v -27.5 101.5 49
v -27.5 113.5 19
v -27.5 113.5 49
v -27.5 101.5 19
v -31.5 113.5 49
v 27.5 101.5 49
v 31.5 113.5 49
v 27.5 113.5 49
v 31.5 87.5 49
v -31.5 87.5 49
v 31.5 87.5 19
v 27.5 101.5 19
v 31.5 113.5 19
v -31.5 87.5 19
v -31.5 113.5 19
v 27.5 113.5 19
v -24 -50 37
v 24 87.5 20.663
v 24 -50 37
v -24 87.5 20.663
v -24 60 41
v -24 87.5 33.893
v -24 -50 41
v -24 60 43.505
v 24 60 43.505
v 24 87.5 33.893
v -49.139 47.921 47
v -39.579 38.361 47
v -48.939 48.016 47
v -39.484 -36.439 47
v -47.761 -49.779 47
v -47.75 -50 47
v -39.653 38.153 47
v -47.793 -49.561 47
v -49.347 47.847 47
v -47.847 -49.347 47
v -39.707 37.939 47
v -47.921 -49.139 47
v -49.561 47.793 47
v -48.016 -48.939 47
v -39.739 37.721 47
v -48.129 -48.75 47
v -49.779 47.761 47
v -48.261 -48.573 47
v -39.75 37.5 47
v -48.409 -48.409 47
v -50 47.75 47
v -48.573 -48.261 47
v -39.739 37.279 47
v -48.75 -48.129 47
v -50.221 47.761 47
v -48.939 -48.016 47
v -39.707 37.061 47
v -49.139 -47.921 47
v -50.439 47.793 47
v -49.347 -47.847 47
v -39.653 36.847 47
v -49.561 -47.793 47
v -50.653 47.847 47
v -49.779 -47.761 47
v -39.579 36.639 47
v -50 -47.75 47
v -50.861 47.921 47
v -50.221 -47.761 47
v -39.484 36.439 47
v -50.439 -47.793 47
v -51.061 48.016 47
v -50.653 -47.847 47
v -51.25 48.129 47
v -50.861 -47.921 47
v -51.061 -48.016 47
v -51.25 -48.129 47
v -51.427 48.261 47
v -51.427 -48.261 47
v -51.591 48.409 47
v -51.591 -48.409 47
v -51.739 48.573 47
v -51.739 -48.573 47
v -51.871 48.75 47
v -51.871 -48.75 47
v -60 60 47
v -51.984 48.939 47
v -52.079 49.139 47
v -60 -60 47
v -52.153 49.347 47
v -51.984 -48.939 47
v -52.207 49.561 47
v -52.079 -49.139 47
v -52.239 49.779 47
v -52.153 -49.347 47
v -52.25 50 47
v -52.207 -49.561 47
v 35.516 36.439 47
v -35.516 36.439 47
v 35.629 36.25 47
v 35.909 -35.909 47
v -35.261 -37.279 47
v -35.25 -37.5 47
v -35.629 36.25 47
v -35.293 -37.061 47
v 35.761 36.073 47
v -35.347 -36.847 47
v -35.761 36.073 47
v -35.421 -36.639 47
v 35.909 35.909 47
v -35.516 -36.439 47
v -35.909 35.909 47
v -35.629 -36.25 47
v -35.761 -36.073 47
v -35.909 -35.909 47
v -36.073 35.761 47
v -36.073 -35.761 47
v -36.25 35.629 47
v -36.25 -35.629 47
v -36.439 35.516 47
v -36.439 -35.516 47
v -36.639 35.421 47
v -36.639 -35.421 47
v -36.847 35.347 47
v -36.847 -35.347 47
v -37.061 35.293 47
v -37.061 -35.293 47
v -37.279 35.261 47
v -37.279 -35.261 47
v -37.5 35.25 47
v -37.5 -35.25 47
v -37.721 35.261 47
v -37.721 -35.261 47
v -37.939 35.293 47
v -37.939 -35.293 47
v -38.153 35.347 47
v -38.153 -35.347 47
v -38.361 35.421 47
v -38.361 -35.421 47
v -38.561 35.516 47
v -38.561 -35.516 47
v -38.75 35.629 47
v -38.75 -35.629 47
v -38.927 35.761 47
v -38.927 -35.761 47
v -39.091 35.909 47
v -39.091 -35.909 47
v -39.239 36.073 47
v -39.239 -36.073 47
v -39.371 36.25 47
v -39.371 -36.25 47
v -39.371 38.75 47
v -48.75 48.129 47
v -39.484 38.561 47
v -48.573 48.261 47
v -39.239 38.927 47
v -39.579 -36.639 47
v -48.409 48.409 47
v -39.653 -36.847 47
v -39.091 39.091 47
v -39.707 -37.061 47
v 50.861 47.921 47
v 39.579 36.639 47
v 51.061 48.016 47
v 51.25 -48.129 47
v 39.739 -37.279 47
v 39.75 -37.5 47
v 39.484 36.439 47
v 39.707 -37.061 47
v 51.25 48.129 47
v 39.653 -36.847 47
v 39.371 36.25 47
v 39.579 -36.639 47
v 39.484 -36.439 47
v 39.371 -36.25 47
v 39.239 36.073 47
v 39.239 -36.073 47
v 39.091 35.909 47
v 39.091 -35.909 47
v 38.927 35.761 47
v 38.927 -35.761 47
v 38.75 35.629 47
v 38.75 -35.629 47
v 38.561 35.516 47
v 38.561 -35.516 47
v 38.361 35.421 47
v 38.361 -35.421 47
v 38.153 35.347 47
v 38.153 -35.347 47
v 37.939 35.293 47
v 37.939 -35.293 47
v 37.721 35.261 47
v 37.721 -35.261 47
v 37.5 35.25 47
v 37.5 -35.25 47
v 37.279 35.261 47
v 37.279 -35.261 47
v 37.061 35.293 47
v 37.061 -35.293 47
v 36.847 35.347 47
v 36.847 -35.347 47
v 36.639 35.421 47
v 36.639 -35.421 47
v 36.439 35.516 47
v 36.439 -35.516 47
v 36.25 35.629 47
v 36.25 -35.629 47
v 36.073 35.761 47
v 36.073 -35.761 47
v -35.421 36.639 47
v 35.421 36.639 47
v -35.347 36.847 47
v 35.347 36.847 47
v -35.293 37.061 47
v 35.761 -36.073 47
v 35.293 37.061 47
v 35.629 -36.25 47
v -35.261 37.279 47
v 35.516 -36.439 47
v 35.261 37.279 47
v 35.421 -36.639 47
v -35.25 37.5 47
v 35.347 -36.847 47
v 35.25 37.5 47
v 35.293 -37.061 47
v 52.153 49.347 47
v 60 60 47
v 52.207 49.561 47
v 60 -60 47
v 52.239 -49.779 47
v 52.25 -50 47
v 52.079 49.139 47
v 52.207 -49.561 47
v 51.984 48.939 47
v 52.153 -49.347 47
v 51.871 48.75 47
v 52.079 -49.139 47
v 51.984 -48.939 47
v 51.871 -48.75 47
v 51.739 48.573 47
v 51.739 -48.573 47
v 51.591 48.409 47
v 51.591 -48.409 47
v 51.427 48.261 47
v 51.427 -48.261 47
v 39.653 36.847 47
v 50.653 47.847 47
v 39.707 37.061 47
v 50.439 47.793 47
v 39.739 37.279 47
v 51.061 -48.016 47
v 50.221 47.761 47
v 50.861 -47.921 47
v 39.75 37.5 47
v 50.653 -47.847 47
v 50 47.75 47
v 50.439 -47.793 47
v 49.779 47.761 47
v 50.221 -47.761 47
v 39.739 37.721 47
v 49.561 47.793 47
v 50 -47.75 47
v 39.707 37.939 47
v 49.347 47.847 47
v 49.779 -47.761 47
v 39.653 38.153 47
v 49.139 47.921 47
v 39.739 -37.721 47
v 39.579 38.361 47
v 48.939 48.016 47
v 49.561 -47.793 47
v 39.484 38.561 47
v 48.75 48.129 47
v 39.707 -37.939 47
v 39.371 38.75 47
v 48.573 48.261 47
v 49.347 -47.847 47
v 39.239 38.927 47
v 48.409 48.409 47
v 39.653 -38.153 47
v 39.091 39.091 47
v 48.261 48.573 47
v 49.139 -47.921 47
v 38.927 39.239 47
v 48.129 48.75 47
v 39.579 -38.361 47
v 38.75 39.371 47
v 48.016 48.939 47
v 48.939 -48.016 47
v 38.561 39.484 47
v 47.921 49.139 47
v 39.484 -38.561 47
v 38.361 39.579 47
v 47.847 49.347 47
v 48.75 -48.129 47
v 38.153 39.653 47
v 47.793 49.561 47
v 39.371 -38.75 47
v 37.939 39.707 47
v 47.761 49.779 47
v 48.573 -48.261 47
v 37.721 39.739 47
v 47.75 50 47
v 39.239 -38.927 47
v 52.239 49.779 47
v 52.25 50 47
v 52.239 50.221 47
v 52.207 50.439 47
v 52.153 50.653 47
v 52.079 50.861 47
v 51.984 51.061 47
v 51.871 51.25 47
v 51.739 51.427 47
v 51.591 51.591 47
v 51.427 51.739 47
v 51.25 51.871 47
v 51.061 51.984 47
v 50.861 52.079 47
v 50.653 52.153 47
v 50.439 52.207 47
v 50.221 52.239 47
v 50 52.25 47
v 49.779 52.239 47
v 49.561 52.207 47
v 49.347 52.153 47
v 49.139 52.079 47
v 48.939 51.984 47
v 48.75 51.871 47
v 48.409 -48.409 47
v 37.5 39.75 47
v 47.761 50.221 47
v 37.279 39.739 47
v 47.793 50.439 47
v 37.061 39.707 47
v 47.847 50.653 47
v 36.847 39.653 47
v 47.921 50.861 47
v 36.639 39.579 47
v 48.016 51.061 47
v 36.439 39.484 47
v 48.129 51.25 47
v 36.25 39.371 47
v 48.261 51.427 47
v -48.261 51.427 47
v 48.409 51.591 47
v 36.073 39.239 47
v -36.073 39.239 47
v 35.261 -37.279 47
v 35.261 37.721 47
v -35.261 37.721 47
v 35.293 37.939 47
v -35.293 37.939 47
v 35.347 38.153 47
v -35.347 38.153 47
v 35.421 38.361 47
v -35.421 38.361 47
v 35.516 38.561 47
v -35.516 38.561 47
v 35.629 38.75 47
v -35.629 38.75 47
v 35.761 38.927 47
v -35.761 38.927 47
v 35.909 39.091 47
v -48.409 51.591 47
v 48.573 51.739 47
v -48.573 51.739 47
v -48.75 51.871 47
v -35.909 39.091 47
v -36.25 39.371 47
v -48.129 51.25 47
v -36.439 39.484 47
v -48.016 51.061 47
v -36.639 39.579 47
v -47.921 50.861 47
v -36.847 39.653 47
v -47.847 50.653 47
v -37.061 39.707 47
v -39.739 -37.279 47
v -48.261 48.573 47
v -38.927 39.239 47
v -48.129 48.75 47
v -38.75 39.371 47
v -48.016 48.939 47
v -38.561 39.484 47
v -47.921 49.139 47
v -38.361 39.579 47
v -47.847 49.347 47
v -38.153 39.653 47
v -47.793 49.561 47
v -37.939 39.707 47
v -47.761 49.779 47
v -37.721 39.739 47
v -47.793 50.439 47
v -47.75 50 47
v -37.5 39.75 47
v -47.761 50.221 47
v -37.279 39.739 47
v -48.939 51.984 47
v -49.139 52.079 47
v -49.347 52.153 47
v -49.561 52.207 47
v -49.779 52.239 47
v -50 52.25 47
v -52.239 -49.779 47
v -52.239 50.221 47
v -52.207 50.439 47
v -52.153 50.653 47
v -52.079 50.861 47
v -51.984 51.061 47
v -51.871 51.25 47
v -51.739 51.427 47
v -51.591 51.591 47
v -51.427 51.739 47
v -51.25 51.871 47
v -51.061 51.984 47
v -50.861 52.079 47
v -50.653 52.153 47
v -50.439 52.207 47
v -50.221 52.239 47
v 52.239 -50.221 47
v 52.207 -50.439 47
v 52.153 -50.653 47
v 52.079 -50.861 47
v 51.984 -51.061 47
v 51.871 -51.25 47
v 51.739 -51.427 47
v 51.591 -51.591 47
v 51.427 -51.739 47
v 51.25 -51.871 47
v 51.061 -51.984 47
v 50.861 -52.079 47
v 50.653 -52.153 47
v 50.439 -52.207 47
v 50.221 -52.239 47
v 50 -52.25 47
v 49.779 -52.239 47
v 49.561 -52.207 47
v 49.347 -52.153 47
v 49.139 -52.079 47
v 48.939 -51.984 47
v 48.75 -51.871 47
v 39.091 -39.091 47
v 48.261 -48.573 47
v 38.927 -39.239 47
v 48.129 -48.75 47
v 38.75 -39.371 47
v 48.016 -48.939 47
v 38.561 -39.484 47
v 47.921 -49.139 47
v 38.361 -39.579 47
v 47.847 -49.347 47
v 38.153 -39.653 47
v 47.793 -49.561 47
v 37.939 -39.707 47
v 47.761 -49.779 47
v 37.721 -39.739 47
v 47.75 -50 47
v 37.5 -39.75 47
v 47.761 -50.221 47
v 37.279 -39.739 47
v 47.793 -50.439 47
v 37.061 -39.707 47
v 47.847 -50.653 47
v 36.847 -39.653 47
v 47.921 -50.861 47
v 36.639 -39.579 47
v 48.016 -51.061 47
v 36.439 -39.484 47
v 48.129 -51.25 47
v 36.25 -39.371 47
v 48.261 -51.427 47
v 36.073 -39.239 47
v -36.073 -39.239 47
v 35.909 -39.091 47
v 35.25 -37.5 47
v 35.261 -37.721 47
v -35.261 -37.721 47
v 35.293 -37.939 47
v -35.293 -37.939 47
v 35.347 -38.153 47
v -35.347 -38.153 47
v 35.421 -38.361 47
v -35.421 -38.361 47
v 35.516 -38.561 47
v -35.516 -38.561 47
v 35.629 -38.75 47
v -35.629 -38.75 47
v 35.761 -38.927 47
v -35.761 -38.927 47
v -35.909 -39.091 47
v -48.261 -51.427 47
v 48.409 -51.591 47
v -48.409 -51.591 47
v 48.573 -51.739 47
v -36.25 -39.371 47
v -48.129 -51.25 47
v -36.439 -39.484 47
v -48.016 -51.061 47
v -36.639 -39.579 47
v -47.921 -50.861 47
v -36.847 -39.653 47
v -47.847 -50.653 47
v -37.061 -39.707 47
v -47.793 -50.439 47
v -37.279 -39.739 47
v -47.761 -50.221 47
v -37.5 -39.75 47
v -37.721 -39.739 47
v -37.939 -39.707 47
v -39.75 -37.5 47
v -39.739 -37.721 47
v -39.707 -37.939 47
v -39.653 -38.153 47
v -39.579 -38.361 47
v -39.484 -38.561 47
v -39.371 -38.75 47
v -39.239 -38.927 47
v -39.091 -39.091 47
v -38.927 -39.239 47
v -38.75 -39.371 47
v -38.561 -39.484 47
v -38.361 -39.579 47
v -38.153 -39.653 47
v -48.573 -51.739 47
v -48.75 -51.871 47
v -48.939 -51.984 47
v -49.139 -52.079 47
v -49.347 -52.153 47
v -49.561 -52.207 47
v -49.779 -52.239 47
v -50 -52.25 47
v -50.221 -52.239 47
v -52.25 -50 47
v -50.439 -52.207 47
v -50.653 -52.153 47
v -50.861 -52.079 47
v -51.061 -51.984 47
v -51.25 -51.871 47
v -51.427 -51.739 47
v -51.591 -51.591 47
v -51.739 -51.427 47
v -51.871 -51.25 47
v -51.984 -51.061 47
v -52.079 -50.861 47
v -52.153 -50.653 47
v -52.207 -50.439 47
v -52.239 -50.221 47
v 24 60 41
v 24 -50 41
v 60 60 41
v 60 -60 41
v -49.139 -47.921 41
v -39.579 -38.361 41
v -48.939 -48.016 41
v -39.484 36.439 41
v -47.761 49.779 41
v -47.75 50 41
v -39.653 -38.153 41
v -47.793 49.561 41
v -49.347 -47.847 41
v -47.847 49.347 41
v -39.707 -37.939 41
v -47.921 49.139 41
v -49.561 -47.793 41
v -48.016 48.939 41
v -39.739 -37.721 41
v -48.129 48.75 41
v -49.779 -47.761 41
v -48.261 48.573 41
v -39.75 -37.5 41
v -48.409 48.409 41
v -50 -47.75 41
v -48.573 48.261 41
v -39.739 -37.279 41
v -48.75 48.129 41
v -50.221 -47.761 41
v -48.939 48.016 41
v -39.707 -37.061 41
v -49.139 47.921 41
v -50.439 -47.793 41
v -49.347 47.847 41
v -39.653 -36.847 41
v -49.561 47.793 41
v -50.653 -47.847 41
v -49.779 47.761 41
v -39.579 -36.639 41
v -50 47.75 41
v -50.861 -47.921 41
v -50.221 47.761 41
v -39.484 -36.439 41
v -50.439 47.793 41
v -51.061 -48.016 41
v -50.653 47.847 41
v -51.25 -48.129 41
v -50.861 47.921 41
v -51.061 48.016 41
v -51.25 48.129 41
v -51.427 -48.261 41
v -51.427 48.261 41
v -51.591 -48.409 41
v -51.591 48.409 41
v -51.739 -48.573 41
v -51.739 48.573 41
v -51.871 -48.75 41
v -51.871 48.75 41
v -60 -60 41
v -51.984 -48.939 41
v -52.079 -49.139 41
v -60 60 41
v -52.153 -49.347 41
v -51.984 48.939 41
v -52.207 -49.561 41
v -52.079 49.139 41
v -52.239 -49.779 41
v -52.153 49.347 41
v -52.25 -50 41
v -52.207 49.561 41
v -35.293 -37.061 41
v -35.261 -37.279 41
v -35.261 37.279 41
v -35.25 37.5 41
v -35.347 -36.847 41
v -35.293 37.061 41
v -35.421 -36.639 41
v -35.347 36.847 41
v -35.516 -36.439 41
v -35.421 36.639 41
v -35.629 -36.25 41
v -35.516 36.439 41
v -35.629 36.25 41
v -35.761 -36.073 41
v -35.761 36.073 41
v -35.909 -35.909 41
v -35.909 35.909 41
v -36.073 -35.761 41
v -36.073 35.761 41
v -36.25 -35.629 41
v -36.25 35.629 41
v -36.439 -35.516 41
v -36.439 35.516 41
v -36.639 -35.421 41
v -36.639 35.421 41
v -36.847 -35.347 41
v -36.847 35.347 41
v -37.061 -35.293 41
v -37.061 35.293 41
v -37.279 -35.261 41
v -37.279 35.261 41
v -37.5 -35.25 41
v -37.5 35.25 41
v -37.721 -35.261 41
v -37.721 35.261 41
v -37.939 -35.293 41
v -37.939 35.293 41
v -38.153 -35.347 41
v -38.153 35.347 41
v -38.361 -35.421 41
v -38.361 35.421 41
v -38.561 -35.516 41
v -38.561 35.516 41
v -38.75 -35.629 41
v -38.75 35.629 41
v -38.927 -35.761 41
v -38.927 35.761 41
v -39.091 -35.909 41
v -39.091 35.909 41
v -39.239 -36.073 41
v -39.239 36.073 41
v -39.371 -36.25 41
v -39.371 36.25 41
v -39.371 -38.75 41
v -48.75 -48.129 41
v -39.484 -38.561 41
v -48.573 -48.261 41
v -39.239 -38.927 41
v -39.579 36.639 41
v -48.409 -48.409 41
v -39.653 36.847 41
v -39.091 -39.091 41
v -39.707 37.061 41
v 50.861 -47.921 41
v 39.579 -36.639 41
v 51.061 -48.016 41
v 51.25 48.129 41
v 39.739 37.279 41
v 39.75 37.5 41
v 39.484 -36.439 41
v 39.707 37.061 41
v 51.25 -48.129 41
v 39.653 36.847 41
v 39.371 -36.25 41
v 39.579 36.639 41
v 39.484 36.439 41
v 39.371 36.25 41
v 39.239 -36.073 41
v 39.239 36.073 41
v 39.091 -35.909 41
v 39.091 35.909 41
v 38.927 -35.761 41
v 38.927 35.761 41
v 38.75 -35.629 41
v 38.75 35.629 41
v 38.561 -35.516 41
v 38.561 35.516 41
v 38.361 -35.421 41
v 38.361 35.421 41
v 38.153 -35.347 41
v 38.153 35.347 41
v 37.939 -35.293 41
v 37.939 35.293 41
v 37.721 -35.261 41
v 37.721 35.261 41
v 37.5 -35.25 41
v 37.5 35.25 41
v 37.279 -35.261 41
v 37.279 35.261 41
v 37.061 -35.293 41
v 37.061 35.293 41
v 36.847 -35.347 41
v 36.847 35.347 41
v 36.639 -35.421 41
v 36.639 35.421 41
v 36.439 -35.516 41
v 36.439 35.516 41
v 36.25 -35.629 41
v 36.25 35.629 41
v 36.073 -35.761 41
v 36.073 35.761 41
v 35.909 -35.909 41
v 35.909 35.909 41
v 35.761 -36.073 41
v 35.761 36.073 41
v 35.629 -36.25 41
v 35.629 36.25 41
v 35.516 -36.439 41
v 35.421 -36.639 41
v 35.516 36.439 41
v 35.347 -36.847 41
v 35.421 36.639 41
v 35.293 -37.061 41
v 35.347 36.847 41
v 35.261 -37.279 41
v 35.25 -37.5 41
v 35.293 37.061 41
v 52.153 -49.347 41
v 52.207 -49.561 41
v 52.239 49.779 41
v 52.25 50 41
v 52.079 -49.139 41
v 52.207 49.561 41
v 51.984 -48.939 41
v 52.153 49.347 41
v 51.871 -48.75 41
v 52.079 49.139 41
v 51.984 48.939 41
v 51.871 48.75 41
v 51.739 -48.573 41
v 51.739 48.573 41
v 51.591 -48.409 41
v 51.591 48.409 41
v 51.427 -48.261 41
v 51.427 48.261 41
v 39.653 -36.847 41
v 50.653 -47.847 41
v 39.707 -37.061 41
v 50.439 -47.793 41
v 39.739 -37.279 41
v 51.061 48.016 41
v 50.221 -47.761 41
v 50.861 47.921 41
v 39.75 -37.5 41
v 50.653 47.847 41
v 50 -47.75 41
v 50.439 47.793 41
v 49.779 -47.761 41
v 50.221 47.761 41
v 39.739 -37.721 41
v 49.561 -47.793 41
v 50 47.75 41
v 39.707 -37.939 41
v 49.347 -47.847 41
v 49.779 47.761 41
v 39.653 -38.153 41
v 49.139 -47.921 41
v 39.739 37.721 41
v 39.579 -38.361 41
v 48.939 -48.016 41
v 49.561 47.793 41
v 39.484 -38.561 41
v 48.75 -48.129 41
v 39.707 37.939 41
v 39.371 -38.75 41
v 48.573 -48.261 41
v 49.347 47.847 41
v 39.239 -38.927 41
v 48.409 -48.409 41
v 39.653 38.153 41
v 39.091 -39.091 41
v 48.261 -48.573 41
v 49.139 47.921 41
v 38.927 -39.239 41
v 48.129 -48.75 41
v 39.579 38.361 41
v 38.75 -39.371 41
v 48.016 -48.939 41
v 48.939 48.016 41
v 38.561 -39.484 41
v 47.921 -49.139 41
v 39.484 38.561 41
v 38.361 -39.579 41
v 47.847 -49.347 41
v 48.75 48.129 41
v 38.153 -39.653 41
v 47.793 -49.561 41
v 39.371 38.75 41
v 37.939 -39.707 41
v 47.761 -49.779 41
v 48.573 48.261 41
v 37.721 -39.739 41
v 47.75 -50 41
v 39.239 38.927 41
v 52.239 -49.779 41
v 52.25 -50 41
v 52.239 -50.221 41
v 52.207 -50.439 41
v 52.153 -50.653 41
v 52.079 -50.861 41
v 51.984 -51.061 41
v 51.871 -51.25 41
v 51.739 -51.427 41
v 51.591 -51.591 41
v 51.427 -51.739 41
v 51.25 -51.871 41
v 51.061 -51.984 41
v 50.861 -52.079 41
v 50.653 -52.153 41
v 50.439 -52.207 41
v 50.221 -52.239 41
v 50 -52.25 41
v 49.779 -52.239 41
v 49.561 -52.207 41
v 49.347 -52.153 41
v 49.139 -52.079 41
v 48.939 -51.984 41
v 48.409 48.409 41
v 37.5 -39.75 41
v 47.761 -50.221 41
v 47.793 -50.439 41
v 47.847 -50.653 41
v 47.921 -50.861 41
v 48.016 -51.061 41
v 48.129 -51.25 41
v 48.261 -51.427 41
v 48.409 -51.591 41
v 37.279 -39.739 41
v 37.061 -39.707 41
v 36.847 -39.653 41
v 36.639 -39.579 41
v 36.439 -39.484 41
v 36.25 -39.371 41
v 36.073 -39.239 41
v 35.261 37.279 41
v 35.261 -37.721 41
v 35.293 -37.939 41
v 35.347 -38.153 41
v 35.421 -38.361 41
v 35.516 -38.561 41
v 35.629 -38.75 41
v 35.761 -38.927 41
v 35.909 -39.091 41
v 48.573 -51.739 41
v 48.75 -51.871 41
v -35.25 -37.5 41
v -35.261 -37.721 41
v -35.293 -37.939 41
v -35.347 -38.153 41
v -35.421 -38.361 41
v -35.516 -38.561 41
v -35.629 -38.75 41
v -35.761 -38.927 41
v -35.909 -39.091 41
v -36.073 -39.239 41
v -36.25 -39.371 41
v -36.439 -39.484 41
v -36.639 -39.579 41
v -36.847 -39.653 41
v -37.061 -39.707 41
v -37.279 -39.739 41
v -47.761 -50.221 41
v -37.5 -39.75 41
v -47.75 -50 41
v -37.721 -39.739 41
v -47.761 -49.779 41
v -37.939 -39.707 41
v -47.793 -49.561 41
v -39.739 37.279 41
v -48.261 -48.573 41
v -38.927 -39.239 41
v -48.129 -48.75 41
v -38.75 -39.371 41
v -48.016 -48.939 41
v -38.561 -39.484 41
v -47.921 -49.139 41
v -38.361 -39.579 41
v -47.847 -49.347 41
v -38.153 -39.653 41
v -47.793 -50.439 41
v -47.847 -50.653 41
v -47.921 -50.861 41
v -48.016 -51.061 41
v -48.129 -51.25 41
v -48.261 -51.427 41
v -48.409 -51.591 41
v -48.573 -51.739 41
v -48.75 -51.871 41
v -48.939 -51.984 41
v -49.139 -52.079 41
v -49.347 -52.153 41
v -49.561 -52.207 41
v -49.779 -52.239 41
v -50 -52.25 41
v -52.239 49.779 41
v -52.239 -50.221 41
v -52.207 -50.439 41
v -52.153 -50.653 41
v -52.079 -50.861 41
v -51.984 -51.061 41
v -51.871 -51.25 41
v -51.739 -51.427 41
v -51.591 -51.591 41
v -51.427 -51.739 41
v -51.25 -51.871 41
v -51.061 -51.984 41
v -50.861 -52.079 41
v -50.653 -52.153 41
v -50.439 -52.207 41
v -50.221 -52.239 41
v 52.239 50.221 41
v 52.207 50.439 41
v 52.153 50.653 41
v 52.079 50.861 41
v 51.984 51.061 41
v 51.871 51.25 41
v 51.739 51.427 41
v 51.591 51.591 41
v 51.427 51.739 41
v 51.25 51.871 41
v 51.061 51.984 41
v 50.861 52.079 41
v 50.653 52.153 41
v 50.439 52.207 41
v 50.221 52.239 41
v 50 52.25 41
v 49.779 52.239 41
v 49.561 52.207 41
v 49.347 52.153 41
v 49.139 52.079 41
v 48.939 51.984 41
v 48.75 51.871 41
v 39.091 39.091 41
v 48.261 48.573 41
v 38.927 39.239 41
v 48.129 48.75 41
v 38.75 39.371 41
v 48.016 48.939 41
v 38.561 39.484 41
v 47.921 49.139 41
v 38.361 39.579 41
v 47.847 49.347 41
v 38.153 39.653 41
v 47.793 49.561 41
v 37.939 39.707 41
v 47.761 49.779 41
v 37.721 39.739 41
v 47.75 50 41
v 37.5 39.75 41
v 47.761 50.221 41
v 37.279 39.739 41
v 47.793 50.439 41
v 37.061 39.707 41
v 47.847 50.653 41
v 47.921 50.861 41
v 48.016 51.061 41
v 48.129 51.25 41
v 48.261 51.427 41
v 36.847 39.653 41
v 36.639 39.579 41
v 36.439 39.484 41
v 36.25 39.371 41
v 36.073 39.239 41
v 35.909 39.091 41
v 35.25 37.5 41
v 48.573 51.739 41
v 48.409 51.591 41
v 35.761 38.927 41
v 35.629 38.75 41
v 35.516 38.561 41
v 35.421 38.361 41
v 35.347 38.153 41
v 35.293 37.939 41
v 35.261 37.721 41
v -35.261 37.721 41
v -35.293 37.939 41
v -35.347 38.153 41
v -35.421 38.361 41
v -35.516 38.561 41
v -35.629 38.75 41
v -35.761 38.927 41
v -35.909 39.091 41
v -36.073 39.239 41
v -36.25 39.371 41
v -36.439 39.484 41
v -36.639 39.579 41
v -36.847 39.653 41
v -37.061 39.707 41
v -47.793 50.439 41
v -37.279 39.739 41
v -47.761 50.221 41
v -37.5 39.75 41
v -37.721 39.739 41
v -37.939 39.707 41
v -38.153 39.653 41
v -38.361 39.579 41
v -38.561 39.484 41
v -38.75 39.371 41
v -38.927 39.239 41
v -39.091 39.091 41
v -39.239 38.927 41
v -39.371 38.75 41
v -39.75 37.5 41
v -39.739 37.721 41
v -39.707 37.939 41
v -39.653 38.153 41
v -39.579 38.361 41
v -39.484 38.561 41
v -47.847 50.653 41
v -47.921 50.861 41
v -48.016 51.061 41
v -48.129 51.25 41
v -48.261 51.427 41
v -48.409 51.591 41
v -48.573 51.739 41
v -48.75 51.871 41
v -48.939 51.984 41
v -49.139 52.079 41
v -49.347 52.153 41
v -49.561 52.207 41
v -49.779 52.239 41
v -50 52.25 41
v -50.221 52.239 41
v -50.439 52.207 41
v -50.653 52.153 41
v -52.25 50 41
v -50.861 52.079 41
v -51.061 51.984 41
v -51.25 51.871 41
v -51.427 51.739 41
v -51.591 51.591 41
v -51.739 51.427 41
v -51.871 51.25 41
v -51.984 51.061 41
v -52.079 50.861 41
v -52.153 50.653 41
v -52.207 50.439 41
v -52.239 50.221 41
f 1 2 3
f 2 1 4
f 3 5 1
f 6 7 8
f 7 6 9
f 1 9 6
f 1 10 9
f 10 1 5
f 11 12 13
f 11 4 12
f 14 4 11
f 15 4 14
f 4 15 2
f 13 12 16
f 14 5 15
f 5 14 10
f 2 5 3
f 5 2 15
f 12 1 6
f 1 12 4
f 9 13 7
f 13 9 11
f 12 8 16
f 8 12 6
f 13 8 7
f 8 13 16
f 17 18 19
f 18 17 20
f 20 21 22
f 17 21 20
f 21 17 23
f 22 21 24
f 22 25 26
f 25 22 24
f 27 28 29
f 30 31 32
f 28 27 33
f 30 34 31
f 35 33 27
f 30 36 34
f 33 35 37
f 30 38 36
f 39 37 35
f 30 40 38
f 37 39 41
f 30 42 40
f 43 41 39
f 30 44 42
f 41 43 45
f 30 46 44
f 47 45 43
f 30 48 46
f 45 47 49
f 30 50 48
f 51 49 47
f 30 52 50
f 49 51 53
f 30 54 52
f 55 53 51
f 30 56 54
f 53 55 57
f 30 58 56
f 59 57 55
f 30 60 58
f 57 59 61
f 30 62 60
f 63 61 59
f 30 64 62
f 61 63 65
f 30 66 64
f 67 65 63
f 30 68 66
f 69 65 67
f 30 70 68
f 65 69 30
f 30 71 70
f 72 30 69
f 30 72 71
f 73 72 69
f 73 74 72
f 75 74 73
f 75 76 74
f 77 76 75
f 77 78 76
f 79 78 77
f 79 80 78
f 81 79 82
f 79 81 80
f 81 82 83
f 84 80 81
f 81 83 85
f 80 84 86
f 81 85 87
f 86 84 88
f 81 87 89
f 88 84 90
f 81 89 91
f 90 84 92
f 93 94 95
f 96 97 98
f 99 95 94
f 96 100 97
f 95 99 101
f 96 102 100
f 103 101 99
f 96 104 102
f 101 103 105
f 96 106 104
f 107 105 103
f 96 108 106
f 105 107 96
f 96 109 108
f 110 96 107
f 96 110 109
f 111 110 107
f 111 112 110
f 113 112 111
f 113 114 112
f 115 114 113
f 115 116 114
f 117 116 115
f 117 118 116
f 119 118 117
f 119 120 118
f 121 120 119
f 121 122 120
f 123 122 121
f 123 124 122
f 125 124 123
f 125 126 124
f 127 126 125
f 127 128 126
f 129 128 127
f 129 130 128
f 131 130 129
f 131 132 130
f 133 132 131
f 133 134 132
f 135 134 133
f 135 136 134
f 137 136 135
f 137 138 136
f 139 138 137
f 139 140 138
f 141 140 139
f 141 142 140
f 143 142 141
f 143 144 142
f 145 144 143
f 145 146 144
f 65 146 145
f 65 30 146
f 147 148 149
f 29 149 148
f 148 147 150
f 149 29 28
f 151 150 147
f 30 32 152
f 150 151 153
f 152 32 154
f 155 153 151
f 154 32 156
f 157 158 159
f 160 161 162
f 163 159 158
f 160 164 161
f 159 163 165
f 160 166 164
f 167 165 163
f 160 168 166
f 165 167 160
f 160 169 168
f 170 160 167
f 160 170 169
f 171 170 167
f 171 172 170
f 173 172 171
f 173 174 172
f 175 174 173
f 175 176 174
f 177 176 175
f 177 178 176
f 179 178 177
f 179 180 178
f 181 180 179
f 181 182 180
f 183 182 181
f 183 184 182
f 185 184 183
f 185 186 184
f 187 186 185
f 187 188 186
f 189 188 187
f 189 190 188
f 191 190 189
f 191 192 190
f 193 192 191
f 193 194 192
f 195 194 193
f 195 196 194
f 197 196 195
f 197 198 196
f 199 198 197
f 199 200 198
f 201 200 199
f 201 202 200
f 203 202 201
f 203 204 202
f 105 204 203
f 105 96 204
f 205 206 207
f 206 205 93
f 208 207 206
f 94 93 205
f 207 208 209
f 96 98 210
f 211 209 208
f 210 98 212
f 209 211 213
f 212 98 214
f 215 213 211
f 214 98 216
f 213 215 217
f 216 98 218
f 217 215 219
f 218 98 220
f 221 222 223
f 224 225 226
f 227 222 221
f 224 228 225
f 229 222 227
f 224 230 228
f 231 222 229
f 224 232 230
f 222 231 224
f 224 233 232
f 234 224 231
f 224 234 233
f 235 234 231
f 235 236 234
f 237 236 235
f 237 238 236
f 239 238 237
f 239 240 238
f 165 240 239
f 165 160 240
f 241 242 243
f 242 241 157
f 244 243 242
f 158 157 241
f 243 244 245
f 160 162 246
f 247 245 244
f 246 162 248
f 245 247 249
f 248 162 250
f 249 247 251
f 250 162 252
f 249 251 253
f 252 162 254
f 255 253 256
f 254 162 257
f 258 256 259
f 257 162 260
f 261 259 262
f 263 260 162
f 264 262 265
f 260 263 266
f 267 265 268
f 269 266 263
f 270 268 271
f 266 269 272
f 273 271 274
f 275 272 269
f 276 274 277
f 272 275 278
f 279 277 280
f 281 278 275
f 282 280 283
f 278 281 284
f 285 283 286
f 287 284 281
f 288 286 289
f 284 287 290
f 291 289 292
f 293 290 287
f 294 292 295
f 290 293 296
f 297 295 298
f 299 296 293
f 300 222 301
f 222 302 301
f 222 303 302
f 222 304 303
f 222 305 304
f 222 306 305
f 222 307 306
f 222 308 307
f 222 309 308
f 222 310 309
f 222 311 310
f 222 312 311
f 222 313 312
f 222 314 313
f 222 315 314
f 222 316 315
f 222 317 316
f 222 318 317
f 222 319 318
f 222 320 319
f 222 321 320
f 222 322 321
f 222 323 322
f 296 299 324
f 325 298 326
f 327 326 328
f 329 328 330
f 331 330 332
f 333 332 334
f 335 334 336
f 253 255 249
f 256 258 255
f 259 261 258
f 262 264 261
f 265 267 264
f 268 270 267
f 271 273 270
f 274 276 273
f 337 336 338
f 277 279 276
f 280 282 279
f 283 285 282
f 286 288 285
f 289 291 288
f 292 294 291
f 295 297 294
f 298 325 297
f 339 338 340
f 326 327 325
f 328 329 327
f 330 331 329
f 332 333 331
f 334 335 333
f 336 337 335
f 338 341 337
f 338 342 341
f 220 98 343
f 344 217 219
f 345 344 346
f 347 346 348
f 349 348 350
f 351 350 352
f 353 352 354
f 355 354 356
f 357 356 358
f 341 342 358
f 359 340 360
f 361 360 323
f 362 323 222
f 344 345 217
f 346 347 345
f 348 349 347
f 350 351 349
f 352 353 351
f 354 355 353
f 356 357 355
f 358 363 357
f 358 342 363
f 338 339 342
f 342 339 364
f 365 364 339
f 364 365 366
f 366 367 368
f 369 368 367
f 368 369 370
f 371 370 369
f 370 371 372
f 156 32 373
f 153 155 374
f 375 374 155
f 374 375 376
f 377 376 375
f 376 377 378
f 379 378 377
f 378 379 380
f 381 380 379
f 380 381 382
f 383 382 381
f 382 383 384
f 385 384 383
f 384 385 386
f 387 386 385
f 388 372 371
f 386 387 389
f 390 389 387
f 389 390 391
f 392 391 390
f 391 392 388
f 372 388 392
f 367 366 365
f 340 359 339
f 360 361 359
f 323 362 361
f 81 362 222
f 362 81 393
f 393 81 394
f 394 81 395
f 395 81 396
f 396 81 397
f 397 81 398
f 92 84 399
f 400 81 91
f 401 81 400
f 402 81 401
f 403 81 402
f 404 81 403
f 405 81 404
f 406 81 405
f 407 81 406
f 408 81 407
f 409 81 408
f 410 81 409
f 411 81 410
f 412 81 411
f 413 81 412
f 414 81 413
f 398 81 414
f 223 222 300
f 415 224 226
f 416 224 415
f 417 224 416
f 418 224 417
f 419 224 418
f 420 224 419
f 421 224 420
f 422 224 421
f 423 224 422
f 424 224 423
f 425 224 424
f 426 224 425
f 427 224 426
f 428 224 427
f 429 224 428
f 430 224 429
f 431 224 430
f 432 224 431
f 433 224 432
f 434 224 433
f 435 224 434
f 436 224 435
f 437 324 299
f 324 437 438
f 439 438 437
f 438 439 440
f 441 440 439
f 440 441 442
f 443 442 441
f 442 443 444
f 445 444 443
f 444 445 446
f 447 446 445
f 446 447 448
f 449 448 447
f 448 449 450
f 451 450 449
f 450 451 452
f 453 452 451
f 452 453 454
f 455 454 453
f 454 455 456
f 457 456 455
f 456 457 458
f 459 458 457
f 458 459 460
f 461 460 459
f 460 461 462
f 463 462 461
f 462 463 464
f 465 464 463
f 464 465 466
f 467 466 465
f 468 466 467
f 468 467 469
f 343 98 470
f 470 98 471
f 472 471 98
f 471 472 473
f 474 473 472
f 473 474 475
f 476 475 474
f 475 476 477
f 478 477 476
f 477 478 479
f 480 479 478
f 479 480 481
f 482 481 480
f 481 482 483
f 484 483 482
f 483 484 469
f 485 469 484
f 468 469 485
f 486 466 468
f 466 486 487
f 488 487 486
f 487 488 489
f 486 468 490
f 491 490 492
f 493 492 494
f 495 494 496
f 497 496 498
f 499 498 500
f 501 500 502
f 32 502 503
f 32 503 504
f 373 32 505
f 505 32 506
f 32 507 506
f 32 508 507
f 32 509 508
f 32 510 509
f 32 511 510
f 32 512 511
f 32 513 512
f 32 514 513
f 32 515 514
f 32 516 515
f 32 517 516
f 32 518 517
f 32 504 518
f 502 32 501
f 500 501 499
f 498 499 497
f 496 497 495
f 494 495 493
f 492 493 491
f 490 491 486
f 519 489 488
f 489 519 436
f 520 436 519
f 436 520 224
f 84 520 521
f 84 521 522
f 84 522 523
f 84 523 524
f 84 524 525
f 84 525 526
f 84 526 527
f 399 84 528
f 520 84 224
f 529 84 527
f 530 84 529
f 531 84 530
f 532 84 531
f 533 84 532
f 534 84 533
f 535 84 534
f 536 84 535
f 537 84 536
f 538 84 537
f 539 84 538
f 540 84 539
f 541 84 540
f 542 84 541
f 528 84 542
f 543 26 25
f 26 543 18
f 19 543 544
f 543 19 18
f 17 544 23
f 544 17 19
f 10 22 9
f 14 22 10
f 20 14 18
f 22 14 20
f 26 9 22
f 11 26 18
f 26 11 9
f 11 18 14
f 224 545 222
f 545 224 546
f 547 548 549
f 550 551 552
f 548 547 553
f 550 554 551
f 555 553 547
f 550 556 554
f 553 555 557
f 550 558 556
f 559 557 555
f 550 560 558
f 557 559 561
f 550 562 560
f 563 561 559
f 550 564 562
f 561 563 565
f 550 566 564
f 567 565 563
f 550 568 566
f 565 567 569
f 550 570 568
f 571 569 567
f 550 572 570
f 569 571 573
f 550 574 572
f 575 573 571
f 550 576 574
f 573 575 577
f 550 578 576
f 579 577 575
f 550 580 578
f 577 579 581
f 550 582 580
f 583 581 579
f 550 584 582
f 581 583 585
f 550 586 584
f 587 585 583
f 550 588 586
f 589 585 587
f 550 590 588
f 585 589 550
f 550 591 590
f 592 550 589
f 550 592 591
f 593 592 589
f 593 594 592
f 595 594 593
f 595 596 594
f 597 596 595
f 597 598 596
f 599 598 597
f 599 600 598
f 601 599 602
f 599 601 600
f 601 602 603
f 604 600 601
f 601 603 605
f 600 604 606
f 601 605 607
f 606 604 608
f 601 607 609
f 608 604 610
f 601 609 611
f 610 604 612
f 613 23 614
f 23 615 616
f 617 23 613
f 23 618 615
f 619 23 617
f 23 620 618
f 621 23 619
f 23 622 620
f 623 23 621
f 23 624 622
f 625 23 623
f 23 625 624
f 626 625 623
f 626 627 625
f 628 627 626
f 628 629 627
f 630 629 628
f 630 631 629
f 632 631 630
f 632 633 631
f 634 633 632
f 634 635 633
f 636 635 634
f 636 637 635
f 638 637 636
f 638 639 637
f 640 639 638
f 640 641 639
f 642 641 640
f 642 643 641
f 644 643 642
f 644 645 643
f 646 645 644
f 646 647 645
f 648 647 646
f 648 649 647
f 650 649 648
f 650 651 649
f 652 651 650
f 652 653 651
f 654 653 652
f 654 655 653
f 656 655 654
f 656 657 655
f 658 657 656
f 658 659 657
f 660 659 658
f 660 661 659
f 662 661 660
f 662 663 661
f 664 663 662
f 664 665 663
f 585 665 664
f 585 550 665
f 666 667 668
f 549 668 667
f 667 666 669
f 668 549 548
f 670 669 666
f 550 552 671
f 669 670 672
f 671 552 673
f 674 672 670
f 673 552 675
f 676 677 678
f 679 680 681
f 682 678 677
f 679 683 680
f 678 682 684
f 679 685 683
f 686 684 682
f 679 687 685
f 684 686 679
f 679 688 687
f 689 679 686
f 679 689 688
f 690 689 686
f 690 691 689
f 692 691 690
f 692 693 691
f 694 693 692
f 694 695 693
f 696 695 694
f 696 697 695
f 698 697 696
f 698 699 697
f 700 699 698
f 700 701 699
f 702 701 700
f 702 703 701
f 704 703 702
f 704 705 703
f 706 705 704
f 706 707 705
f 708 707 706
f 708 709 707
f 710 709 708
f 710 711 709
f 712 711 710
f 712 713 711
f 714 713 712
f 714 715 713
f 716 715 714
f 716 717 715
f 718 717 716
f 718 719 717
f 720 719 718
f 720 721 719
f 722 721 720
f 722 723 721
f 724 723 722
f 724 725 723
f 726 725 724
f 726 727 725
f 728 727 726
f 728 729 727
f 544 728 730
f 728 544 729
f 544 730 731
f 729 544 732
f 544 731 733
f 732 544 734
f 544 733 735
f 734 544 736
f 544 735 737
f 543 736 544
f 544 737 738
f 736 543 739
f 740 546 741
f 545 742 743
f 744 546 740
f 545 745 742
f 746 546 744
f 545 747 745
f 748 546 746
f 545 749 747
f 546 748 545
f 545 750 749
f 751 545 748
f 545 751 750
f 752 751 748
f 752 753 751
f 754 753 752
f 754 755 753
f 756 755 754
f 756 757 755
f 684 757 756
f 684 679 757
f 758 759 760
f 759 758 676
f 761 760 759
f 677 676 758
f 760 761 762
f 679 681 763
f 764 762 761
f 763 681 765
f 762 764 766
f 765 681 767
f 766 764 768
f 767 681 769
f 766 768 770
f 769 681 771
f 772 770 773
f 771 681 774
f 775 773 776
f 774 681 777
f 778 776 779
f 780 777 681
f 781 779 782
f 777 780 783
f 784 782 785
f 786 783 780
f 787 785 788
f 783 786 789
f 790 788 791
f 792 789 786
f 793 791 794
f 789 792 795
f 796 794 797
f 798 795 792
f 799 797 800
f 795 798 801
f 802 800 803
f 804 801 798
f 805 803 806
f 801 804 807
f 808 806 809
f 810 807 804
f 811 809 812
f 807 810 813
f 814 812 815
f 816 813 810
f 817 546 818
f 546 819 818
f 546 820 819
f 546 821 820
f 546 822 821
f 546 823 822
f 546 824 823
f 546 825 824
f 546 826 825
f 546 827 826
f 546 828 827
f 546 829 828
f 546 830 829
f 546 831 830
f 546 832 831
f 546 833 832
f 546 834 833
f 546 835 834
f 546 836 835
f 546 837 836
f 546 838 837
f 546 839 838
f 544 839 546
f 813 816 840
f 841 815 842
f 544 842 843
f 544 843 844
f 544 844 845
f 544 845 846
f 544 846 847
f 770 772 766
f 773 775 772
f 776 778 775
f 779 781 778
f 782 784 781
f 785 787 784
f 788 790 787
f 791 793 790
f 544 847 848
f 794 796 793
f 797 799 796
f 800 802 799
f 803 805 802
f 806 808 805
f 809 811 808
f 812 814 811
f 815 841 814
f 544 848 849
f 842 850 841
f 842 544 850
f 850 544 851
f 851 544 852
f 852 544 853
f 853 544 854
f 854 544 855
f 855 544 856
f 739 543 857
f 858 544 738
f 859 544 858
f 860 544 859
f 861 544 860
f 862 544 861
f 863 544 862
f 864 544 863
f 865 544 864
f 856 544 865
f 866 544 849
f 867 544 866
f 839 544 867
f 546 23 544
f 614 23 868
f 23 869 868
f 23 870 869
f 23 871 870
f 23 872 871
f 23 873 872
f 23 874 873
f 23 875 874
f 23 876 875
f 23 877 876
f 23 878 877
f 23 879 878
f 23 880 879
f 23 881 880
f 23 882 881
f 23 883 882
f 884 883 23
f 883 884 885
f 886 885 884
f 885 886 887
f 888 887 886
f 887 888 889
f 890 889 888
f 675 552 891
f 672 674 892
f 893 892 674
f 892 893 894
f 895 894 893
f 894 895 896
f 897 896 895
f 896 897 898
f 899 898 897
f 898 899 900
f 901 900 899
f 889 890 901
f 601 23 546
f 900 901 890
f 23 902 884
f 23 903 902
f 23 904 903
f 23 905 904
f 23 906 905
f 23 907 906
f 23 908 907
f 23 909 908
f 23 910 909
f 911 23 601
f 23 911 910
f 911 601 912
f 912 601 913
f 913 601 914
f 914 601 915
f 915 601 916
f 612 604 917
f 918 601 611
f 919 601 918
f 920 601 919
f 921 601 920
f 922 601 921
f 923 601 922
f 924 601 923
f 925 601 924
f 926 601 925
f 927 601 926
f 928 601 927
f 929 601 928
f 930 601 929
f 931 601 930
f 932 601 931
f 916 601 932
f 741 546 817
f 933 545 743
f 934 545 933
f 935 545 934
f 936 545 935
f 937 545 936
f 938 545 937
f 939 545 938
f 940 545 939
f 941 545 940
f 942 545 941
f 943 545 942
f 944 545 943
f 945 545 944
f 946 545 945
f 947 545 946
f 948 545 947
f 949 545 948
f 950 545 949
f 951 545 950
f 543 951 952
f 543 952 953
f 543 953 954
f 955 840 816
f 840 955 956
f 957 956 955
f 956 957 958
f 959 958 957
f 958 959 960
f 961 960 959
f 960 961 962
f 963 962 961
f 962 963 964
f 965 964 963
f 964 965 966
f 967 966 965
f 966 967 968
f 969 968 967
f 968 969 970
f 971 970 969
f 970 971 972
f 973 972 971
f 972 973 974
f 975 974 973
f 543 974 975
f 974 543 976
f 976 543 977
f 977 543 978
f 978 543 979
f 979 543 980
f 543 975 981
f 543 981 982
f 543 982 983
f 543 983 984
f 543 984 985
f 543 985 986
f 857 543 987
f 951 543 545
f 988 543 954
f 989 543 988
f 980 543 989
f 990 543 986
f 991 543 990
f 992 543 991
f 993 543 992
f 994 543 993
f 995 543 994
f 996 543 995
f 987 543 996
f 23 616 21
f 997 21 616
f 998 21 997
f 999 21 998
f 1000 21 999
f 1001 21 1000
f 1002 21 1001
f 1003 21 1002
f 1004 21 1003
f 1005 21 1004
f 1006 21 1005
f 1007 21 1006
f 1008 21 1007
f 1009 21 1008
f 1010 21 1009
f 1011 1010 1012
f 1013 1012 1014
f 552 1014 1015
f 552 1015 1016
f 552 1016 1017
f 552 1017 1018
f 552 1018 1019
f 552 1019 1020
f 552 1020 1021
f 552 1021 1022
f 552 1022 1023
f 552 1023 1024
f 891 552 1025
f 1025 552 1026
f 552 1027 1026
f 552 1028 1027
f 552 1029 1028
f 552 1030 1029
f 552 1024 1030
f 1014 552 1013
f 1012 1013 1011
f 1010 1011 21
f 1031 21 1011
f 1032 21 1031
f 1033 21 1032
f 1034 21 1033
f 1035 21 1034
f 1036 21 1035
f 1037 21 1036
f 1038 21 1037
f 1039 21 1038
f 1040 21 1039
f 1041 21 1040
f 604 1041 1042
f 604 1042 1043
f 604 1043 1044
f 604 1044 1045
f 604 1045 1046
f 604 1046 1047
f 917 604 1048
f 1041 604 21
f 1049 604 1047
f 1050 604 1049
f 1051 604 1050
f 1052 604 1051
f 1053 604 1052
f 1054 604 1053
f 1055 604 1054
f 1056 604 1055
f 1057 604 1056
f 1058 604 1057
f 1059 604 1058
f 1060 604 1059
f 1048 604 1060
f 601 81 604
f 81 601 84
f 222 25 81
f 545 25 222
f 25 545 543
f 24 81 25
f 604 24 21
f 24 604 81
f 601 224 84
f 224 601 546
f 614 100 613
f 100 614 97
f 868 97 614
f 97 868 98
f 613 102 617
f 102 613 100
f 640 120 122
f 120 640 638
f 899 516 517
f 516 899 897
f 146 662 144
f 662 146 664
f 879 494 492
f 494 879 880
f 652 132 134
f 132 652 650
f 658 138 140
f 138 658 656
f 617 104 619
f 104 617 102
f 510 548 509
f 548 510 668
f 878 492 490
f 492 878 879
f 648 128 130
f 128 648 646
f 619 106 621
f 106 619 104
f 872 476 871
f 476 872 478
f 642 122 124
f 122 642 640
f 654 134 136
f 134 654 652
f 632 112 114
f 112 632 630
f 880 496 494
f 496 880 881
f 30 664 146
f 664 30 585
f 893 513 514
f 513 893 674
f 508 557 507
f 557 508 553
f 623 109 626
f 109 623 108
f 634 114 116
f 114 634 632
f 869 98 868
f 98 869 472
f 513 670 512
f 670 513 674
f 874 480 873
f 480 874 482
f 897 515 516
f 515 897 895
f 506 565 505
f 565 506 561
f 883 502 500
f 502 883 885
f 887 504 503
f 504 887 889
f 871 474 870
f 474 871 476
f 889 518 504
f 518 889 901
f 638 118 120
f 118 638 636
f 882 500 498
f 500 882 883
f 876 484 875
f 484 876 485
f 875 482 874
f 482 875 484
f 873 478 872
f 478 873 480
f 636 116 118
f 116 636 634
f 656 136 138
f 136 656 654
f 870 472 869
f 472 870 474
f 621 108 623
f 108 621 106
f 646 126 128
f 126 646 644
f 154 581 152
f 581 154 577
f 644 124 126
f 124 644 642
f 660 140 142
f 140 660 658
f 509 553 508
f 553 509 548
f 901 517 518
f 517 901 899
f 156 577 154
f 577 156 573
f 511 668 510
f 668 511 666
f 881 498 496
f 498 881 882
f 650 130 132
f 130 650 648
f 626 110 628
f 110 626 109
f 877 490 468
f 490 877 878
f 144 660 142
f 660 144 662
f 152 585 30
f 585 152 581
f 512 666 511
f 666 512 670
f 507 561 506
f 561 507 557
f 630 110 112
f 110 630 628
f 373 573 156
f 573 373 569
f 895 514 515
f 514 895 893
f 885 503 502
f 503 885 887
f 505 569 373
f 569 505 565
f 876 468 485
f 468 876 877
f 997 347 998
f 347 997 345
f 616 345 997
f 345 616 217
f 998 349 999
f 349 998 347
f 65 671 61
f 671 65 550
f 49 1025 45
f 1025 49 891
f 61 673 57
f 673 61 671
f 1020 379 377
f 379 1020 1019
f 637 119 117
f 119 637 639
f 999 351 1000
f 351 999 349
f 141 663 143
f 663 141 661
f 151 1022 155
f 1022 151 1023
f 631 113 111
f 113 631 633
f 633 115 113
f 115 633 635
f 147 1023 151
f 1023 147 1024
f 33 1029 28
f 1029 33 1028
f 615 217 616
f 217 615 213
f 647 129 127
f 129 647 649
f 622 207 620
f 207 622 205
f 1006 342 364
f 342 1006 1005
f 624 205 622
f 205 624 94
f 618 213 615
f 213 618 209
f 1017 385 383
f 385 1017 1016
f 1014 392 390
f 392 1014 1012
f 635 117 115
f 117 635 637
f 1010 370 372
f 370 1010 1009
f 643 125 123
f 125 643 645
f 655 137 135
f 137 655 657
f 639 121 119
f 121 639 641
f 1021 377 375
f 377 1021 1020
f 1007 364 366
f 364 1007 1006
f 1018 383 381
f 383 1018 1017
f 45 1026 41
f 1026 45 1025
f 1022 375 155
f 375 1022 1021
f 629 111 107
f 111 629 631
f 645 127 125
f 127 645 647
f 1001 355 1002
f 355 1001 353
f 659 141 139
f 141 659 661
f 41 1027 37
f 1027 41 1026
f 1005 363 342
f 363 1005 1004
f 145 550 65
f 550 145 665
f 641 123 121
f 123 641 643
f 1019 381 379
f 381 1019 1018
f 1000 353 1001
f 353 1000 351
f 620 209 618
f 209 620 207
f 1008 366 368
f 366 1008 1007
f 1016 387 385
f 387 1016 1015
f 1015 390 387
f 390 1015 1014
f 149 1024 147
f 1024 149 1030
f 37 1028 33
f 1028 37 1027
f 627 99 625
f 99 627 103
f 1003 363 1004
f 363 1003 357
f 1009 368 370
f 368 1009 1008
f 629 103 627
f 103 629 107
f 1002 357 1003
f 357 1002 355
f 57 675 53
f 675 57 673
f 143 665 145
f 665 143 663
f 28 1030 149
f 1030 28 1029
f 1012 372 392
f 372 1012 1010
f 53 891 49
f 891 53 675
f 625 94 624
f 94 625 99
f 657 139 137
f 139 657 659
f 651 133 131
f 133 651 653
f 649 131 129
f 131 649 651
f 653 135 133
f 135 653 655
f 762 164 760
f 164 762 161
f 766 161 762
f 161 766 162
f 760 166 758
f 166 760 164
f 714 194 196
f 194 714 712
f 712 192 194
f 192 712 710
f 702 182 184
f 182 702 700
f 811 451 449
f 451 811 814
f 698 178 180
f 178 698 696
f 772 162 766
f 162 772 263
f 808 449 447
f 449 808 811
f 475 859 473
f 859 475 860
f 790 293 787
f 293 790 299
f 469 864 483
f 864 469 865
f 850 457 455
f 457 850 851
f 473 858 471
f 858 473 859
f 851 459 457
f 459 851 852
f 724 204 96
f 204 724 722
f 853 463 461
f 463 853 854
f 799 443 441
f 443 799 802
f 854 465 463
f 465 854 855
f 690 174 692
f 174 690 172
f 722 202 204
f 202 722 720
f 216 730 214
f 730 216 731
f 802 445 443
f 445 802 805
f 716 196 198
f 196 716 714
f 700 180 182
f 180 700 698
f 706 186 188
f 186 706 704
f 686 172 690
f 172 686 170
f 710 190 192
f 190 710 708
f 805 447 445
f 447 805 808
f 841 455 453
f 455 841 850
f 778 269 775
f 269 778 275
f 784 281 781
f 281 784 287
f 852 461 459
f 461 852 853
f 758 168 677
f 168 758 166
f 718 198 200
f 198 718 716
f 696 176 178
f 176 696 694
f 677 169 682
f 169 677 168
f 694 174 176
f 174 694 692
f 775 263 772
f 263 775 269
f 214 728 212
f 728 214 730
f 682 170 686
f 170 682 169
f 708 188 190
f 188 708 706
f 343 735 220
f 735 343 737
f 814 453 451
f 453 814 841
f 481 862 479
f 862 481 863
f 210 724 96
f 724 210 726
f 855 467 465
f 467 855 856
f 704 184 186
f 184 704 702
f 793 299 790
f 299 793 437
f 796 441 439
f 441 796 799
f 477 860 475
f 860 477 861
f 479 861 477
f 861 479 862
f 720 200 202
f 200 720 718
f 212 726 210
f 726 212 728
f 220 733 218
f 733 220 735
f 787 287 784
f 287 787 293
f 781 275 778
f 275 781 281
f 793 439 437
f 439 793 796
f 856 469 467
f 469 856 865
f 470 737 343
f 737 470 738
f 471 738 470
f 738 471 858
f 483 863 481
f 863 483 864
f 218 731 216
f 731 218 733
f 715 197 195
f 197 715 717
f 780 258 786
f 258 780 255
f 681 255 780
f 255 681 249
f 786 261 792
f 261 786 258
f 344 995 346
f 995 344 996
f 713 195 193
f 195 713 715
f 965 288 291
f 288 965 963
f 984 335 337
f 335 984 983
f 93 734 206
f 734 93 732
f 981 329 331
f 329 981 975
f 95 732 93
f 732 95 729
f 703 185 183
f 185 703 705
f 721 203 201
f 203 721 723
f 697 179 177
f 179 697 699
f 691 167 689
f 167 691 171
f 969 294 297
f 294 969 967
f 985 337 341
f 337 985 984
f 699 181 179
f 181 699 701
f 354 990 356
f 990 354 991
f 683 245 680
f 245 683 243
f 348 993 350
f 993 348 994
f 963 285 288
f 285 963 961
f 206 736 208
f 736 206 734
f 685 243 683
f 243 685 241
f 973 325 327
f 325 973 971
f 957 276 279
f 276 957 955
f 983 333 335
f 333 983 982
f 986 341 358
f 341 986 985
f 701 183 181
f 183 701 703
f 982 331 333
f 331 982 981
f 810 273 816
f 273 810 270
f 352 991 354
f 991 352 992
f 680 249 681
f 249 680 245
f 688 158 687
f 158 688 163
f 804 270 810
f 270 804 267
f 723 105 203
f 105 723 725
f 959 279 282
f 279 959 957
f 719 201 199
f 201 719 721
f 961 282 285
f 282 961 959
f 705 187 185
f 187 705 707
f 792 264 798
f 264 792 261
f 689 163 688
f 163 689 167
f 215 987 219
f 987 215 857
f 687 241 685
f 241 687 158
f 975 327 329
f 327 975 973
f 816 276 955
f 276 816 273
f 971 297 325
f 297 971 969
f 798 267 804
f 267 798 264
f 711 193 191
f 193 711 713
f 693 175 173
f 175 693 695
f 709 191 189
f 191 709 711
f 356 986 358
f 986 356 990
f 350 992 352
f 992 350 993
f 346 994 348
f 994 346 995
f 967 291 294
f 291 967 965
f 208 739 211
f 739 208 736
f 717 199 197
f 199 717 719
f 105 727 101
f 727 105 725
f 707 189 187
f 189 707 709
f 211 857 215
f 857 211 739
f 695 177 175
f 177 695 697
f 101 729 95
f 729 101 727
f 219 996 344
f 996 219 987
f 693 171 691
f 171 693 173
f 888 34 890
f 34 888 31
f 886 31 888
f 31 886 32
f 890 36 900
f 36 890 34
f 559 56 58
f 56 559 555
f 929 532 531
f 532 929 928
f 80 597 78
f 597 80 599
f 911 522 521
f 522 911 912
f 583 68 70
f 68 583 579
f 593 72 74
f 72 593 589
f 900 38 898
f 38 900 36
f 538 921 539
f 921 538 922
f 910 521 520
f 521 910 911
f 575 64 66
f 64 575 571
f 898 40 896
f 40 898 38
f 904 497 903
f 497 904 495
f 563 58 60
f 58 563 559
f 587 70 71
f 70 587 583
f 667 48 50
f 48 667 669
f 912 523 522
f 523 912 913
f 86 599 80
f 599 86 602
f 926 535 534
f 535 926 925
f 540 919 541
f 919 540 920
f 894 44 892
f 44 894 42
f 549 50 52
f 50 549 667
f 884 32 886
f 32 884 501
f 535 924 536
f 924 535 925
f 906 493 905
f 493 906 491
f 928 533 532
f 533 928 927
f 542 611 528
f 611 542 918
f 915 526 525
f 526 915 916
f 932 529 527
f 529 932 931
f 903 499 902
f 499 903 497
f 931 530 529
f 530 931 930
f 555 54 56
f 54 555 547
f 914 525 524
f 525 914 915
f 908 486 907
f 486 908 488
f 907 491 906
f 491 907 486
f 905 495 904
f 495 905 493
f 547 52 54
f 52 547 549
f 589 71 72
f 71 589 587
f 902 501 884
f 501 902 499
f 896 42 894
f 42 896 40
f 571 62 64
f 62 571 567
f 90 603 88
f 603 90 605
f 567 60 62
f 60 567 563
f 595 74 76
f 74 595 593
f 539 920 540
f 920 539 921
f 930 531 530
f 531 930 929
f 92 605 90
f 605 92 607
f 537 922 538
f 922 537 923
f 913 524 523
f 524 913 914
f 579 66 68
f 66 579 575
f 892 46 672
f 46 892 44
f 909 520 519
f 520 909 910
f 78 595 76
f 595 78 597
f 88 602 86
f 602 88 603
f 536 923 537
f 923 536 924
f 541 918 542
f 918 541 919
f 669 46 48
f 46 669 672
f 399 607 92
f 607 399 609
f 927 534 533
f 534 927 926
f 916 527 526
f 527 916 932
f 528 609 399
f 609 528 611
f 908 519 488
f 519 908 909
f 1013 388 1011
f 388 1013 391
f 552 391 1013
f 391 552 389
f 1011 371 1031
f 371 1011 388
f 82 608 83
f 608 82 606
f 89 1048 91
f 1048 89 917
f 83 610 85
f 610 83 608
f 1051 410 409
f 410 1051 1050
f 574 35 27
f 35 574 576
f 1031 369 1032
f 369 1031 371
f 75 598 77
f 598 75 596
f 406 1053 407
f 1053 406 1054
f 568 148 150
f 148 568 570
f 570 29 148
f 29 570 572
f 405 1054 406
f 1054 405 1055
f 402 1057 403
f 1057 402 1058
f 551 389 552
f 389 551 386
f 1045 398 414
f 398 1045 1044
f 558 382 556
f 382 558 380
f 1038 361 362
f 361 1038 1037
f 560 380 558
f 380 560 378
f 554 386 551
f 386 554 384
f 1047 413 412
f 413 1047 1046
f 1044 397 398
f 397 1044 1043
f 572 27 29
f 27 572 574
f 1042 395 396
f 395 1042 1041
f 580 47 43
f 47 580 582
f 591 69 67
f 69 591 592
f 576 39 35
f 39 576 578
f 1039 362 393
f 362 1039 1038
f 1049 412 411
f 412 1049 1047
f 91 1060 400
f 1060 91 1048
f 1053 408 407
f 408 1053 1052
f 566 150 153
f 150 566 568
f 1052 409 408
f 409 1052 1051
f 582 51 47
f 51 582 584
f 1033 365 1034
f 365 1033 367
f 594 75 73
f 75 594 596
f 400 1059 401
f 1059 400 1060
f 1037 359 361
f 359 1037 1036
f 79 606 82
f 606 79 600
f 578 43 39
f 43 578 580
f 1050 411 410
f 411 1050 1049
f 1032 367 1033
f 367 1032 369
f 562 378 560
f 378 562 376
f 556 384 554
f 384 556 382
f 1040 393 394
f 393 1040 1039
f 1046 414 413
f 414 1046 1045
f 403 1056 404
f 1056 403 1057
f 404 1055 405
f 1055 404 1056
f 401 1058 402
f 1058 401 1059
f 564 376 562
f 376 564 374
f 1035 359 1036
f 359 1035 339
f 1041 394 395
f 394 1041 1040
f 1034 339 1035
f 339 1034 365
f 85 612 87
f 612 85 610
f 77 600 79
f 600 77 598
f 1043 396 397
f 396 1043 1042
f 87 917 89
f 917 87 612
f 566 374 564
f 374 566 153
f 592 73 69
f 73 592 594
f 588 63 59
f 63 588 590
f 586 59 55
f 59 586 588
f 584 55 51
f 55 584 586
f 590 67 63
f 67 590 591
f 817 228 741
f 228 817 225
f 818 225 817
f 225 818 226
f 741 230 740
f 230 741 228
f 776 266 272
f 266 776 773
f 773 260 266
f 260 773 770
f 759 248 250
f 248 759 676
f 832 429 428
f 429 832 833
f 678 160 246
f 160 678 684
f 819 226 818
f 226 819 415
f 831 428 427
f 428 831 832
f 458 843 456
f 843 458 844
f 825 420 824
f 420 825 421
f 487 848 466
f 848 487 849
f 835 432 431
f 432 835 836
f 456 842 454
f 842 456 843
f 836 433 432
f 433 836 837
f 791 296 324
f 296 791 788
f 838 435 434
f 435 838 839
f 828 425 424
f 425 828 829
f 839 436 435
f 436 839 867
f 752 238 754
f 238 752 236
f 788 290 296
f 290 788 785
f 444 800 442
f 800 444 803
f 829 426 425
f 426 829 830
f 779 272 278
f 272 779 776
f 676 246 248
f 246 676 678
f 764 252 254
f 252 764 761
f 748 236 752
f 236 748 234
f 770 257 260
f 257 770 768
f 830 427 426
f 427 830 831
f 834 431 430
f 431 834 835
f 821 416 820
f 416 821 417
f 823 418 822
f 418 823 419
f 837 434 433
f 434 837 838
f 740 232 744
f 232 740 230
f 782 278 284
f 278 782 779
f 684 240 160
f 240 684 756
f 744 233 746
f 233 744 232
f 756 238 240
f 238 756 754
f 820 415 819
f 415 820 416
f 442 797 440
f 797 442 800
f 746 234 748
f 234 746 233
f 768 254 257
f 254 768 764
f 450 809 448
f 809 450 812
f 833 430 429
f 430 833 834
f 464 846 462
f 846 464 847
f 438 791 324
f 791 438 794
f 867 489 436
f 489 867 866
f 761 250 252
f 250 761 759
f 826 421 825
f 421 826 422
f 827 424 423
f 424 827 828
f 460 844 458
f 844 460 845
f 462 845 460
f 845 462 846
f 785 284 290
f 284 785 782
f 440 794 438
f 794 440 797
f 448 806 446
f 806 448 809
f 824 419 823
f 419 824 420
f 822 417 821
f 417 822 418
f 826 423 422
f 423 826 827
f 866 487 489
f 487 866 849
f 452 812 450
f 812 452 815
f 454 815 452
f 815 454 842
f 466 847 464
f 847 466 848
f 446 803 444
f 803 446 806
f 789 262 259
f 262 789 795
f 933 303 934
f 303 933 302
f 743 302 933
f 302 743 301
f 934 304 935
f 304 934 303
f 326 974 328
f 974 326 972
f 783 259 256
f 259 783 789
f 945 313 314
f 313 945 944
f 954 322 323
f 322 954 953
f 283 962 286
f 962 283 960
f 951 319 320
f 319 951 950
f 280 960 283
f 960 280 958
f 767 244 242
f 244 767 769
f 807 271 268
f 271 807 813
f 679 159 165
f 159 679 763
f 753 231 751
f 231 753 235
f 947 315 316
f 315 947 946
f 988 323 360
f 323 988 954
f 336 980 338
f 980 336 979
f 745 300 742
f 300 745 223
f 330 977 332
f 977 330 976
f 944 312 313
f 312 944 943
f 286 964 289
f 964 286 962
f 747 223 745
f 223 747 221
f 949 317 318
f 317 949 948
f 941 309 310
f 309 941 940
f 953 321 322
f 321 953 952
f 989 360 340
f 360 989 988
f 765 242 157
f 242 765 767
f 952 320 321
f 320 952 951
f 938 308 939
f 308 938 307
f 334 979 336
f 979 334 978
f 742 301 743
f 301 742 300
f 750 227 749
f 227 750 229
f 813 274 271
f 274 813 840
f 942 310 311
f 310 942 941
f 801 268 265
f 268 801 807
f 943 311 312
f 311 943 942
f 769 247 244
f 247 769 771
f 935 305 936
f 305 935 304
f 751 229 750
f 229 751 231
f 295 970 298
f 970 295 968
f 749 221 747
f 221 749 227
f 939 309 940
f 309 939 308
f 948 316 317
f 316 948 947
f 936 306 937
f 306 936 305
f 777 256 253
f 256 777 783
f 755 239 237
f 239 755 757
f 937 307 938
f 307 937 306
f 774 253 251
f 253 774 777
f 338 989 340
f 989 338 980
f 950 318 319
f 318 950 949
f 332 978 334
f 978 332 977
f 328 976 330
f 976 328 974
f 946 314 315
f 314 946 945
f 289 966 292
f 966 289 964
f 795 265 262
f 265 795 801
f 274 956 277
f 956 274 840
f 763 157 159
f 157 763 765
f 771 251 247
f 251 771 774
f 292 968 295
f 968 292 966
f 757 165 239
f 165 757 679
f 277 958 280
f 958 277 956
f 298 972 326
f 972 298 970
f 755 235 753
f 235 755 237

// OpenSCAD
// SPDX-License-Identifier: CERN-OHL-S-2.0
// TX02 / Xiaomi 1S monitor-light one-piece VESA adapter
// Units: millimeters
// This is the printable counterpart of docs/tx02-vesa-cradle-r2.html.

/* [Output] */

part = "mount"; // [mount, fit_test]

/* [VESA adapter] */

vesa_plate_width = 120;
vesa_plate_height = 120;
vesa_plate_thickness = 6;
vesa_plate_center_z = 44;
vesa_hole_diameter = 4.5;

include_vesa_75 = true;
include_vesa_100 = true;

// 0 = plain through holes; -1 / 1 = countersink the front / rear face.
vesa_countersink_side = 0;
vesa_countersink_diameter = 9.0;
vesa_countersink_depth = 2.0;

/* [Integrated support] */

support_width = 63;
clamp_pad_height = 14;
clamp_pad_depth = 30;
clamp_pad_center_z = 34;
clamp_pad_top_y = 101.5;

guide_inner_gap = 55;
guide_tab_width = 4;
guide_tab_height = 12;

support_web_width = 48;
support_web_bottom_y = -50;
support_web_shoulder_y = 50;

/* [Quality] */

$fn = 64;

assert(include_vesa_75 || include_vesa_100,
       "At least one VESA pattern must be enabled");
assert(vesa_plate_width >= 110 && vesa_plate_height >= 110,
       "The VESA plate must leave material around the 100 mm holes");
assert(support_width == guide_inner_gap + 2 * guide_tab_width,
       "support_width must equal the guide inner gap plus two tab widths");

vesa_plate_left_face = vesa_plate_center_z - vesa_plate_thickness / 2;
vesa_plate_right_face = vesa_plate_center_z + vesa_plate_thickness / 2;
clamp_pad_center_y = clamp_pad_top_y - clamp_pad_height / 2;
guide_tab_x = guide_inner_gap / 2 + guide_tab_width / 2;

function support_profile() = [
    [clamp_pad_center_z - clamp_pad_depth / 2, clamp_pad_top_y],
    [clamp_pad_center_z - clamp_pad_depth / 2 + 10, clamp_pad_top_y],
    [vesa_plate_right_face, support_web_shoulder_y],
    [vesa_plate_right_face, support_web_bottom_y],
    [vesa_plate_right_face - 10, support_web_bottom_y]
];

module extrude_profile_x(width, points) {
    rotate([0, -90, 0])
        linear_extrude(height = width, center = true, convexity = 16)
            polygon(points = points);
}

module vesa_plate() {
    translate([0, 0, vesa_plate_center_z])
        cube([
            vesa_plate_width,
            vesa_plate_height,
            vesa_plate_thickness
        ], center = true);
}

module integrated_support() {
    extrude_profile_x(support_web_width, support_profile());

    translate([0, clamp_pad_center_y, clamp_pad_center_z])
        cube([
            support_width,
            clamp_pad_height,
            clamp_pad_depth
        ], center = true);

    for (x = [-guide_tab_x, guide_tab_x])
        translate([
            x,
            clamp_pad_top_y + guide_tab_height / 2,
            clamp_pad_center_z
        ])
            cube([
                guide_tab_width,
                guide_tab_height,
                clamp_pad_depth
            ], center = true);
}

module vesa_holes(pattern) {
    for (x = [-pattern / 2, pattern / 2])
        for (y = [-pattern / 2, pattern / 2]) {
            translate([x, y, vesa_plate_center_z])
                cylinder(
                    h = vesa_plate_thickness + 2,
                    d = vesa_hole_diameter,
                    center = true
                );

            if (vesa_countersink_side == -1)
                translate([x, y, vesa_plate_left_face - 0.01])
                    cylinder(
                        h = vesa_countersink_depth + 0.01,
                        d1 = vesa_countersink_diameter,
                        d2 = vesa_hole_diameter
                    );

            if (vesa_countersink_side == 1)
                translate([x, y, vesa_plate_right_face + 0.01])
                    mirror([0, 0, 1])
                        cylinder(
                            h = vesa_countersink_depth + 0.01,
                            d1 = vesa_countersink_diameter,
                            d2 = vesa_hole_diameter
                        );
        }
}

module fit_test() {
    // Print this first to verify the Xiaomi base fits the 55 mm guide gap.
    translate([0, 0, clamp_pad_height / 2])
        cube([
            support_width,
            clamp_pad_depth,
            clamp_pad_height
        ], center = true);

    for (x = [-guide_tab_x, guide_tab_x])
        translate([
            x,
            0,
            clamp_pad_height + guide_tab_height / 2
        ])
            cube([
                guide_tab_width,
                clamp_pad_depth,
                guide_tab_height
            ], center = true);
}

module mount() {
    difference() {
        union() {
            vesa_plate();
            integrated_support();
        }

        if (include_vesa_75)
            vesa_holes(75);
        if (include_vesa_100)
            vesa_holes(100);
    }
}

if (part == "fit_test")
    fit_test();
else
    mount();
